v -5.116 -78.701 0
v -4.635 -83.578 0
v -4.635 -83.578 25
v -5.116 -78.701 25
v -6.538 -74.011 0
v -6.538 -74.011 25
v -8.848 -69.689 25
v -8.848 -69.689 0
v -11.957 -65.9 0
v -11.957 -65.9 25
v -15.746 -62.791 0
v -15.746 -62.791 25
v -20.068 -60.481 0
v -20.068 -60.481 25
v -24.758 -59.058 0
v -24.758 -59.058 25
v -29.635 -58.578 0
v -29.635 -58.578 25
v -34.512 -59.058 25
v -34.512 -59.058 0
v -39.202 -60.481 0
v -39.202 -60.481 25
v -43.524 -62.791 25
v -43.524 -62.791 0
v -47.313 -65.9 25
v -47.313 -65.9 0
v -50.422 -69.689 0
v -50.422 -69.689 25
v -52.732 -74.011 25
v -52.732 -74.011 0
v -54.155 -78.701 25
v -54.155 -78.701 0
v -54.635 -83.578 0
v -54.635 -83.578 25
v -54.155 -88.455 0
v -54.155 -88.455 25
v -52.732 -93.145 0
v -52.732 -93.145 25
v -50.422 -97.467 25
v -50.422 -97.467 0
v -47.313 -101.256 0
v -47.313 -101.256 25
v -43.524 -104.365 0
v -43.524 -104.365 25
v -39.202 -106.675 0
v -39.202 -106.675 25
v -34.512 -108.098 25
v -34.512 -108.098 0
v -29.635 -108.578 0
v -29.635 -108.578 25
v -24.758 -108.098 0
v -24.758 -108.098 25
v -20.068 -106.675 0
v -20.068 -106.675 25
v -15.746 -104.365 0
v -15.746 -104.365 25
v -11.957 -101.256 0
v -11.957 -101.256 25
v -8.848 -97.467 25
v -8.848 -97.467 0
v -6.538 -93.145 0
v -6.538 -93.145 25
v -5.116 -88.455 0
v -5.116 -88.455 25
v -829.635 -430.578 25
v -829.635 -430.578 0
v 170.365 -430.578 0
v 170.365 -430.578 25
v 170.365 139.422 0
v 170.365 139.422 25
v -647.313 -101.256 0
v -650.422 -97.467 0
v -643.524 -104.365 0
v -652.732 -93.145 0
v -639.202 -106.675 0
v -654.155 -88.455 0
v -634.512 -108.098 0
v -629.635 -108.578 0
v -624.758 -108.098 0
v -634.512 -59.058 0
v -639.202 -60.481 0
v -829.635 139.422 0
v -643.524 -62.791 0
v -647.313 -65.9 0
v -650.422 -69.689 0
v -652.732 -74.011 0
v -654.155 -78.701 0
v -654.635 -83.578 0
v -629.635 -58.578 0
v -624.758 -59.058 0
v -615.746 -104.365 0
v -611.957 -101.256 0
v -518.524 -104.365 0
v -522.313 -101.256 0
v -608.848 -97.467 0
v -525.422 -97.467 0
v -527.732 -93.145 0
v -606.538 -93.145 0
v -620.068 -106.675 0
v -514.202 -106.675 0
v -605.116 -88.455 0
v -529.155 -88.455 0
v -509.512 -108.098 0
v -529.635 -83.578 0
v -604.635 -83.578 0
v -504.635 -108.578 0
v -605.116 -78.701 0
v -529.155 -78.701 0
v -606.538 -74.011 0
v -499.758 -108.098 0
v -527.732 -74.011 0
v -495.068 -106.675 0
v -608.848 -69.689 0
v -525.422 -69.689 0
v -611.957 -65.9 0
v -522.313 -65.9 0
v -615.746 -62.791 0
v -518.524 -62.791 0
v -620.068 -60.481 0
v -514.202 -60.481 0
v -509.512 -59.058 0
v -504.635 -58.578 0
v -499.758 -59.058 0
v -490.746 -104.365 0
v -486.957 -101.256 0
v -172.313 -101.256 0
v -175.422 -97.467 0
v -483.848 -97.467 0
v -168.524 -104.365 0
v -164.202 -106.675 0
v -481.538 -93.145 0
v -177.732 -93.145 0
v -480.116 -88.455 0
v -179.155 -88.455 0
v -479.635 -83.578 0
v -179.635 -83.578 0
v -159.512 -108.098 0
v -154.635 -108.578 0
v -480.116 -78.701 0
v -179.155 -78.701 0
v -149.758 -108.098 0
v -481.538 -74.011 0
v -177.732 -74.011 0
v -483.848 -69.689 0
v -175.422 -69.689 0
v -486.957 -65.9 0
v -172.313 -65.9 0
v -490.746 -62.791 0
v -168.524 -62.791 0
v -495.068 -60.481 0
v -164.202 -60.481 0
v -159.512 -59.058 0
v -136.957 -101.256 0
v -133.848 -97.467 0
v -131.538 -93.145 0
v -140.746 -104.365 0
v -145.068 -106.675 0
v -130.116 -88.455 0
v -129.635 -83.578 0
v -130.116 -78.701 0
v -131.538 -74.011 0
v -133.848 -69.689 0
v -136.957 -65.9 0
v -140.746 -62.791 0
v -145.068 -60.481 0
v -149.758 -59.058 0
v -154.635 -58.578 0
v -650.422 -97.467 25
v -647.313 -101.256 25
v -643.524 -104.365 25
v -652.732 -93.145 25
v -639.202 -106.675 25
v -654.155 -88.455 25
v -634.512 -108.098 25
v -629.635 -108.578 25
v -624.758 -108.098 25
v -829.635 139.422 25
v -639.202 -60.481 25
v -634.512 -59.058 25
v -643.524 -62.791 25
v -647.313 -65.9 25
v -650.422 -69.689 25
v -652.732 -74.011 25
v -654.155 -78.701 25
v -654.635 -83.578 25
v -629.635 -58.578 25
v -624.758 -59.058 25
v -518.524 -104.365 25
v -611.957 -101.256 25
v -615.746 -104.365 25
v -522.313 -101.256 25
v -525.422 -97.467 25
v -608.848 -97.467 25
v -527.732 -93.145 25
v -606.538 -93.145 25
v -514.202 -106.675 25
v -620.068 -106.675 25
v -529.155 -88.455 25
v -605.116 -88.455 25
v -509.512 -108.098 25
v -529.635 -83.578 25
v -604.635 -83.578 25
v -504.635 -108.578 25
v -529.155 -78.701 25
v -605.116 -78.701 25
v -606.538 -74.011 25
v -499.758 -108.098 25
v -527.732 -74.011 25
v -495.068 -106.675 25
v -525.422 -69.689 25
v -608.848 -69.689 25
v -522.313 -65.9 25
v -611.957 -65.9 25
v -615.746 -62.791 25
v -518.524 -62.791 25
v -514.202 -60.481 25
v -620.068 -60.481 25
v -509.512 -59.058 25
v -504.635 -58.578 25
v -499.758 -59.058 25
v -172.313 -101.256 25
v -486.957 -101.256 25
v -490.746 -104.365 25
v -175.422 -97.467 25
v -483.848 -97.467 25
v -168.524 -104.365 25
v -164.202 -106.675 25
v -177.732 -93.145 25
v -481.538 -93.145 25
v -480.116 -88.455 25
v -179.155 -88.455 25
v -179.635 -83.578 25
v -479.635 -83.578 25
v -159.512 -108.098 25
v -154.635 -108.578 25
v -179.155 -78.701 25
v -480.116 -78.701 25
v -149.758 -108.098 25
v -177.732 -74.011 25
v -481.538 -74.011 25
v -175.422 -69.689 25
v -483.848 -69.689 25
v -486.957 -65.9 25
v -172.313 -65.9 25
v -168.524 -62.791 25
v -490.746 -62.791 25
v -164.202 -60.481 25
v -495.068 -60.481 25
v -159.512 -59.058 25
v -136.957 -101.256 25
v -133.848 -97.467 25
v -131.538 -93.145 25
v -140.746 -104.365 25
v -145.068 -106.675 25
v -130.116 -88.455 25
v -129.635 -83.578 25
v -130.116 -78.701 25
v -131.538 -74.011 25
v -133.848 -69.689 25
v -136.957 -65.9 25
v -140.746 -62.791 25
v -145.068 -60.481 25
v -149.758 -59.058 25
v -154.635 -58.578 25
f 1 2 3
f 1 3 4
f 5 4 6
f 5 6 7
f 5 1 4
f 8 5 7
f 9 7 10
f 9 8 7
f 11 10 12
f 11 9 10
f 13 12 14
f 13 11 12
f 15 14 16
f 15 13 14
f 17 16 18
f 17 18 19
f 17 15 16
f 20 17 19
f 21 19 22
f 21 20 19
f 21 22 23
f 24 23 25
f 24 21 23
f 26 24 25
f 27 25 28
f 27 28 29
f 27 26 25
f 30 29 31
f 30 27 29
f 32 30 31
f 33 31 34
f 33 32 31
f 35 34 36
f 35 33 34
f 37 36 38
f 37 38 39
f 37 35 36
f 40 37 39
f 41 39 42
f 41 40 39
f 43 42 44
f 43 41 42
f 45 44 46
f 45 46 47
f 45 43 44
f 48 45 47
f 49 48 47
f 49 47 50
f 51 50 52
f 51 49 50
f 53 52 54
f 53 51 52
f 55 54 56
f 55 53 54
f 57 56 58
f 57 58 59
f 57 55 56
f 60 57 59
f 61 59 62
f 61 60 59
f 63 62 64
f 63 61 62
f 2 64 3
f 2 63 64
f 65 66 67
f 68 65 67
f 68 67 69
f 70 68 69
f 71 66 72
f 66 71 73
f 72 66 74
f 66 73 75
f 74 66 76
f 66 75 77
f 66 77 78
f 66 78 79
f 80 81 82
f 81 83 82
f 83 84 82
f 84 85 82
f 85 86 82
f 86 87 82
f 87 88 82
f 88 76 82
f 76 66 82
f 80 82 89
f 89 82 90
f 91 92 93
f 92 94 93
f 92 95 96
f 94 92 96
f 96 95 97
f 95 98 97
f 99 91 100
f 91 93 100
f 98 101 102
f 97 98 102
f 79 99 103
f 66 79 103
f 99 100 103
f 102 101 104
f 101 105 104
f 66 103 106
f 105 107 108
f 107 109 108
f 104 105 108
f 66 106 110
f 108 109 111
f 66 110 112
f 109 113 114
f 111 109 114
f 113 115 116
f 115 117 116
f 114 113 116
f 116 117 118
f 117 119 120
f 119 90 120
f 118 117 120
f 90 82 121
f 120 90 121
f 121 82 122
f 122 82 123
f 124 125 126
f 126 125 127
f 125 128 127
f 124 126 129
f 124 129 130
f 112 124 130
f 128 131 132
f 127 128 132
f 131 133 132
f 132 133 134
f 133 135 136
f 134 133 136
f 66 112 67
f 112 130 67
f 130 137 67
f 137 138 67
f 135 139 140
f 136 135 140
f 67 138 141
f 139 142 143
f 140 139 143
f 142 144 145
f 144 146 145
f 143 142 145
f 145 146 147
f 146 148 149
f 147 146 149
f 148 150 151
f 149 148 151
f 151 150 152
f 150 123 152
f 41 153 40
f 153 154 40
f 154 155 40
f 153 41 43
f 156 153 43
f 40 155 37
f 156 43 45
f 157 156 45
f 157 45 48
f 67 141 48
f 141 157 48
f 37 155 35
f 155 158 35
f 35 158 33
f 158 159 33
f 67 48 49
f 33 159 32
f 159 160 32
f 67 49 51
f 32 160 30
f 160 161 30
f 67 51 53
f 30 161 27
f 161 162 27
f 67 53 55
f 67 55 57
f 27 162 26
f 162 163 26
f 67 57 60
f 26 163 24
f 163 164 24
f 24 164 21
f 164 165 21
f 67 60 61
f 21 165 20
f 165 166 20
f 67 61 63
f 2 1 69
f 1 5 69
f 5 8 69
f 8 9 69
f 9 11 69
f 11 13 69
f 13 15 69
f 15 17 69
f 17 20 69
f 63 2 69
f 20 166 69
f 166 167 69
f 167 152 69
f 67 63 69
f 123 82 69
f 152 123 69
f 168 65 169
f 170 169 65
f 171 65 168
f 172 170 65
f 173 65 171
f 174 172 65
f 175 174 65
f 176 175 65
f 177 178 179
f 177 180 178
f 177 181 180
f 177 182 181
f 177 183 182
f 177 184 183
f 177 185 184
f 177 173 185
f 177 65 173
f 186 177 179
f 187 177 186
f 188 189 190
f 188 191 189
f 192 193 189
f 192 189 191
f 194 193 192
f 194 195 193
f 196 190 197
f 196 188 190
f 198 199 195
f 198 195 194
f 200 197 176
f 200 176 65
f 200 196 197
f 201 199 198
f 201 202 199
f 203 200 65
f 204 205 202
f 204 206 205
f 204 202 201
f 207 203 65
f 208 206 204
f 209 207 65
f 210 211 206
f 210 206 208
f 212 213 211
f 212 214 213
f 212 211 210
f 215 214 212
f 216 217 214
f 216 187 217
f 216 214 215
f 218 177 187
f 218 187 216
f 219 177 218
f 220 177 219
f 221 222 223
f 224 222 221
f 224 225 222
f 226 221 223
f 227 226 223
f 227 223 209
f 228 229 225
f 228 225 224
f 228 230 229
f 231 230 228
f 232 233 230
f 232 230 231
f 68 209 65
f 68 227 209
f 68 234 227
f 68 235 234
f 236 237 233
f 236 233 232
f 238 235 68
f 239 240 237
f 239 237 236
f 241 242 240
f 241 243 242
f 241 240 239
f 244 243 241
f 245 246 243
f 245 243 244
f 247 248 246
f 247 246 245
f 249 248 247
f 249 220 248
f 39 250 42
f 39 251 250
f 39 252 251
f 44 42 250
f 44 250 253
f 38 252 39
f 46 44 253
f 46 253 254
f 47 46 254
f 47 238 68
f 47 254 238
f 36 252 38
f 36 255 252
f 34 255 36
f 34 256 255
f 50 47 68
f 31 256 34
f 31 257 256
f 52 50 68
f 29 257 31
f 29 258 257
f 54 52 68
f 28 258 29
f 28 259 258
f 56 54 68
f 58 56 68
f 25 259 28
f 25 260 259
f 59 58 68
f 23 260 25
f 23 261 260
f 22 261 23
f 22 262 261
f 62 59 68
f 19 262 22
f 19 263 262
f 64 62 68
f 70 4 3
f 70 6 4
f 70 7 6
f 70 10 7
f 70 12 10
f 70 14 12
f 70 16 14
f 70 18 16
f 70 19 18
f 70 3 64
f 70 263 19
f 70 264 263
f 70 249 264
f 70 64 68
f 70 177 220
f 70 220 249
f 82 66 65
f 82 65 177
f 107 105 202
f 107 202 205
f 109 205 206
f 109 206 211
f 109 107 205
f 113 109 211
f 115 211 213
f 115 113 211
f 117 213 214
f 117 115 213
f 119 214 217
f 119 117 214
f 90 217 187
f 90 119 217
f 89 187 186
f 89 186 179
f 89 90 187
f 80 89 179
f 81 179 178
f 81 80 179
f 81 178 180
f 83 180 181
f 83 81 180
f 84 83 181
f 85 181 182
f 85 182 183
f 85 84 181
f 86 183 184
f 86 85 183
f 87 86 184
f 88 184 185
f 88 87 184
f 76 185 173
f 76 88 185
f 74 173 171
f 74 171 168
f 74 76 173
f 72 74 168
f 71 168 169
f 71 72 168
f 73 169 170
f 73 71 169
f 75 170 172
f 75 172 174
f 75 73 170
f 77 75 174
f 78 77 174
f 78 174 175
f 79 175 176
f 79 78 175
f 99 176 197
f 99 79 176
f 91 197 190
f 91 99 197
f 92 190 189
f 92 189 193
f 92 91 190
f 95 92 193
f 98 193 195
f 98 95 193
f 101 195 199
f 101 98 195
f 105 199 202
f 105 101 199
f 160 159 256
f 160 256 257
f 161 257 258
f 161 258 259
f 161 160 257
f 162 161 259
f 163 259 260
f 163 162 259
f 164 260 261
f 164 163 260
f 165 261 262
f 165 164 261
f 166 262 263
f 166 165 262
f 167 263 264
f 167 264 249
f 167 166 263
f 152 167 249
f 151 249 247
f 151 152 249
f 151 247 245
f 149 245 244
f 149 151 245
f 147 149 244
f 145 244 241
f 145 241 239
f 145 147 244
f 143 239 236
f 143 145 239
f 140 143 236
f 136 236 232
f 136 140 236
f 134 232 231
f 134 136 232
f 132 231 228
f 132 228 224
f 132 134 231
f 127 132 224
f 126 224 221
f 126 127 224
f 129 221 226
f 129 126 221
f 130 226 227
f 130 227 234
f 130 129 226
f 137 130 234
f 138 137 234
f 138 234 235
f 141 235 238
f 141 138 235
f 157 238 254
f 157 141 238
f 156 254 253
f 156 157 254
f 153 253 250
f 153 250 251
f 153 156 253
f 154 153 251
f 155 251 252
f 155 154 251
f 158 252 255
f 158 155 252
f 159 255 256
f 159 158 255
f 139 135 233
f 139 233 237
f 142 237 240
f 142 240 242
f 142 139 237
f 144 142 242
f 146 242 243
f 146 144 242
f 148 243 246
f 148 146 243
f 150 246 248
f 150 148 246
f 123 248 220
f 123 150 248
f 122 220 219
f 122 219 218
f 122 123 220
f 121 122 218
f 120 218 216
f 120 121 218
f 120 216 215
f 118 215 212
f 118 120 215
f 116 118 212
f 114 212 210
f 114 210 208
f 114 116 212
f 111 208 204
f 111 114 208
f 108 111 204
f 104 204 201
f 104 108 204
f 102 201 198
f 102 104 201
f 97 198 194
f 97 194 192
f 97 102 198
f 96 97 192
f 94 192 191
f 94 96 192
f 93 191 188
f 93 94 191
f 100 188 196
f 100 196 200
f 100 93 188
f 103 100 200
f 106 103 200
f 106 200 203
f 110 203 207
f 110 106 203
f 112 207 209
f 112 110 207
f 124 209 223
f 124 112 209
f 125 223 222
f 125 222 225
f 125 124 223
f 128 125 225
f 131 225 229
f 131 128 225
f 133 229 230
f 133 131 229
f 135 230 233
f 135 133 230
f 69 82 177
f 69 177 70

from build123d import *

# Parameters (mm, degrees)
F0_W     = 1000
F0_H     = 570
F0_R     = 25
F1_DEPTH = 25
F2_DEPTH = 25
F3_DEPTH = 25


with BuildPart() as f1:
    # F0 (on Top) → F1 (new body)
    with BuildSketch(Plane.XY):
        with Locations((-329.635155, -145.5779)):
            Rectangle(F0_W, F0_H)
        with Locations((-629.635155, -83.5779)):
            Circle(F0_R, mode=Mode.SUBTRACT)
        with Locations((-504.635155, -83.5779)):
            Circle(F0_R, mode=Mode.SUBTRACT)
        with Locations((-154.635155, -83.5779)):
            Circle(F0_R, mode=Mode.SUBTRACT)
        with Locations((-29.635155, -83.5779)):
            Circle(F0_R, mode=Mode.SUBTRACT)
    extrude(amount=F1_DEPTH)

    # F0 (on Top) → F2 (join)
    with BuildSketch(Plane.XY):
        with Locations((-329.635155, -145.5779)):
            Rectangle(F0_W, F0_H)
        with Locations((-629.635155, -83.5779)):
            Circle(F0_R, mode=Mode.SUBTRACT)
        with Locations((-504.635155, -83.5779)):
            Circle(F0_R, mode=Mode.SUBTRACT)
        with Locations((-154.635155, -83.5779)):
            Circle(F0_R, mode=Mode.SUBTRACT)
        with Locations((-29.635155, -83.5779)):
            Circle(F0_R, mode=Mode.SUBTRACT)
    extrude(amount=F2_DEPTH)

    # F0 (on Top) → F3 (join)
    with BuildSketch(Plane.XY):
        with Locations((-329.635155, -145.5779)):
            Rectangle(F0_W, F0_H)
        with Locations((-629.635155, -83.5779)):
            Circle(F0_R, mode=Mode.SUBTRACT)
        with Locations((-504.635155, -83.5779)):
            Circle(F0_R, mode=Mode.SUBTRACT)
        with Locations((-154.635155, -83.5779)):
            Circle(F0_R, mode=Mode.SUBTRACT)
        with Locations((-29.635155, -83.5779)):
            Circle(F0_R, mode=Mode.SUBTRACT)
    extrude(amount=F3_DEPTH)


solid = f1.part
